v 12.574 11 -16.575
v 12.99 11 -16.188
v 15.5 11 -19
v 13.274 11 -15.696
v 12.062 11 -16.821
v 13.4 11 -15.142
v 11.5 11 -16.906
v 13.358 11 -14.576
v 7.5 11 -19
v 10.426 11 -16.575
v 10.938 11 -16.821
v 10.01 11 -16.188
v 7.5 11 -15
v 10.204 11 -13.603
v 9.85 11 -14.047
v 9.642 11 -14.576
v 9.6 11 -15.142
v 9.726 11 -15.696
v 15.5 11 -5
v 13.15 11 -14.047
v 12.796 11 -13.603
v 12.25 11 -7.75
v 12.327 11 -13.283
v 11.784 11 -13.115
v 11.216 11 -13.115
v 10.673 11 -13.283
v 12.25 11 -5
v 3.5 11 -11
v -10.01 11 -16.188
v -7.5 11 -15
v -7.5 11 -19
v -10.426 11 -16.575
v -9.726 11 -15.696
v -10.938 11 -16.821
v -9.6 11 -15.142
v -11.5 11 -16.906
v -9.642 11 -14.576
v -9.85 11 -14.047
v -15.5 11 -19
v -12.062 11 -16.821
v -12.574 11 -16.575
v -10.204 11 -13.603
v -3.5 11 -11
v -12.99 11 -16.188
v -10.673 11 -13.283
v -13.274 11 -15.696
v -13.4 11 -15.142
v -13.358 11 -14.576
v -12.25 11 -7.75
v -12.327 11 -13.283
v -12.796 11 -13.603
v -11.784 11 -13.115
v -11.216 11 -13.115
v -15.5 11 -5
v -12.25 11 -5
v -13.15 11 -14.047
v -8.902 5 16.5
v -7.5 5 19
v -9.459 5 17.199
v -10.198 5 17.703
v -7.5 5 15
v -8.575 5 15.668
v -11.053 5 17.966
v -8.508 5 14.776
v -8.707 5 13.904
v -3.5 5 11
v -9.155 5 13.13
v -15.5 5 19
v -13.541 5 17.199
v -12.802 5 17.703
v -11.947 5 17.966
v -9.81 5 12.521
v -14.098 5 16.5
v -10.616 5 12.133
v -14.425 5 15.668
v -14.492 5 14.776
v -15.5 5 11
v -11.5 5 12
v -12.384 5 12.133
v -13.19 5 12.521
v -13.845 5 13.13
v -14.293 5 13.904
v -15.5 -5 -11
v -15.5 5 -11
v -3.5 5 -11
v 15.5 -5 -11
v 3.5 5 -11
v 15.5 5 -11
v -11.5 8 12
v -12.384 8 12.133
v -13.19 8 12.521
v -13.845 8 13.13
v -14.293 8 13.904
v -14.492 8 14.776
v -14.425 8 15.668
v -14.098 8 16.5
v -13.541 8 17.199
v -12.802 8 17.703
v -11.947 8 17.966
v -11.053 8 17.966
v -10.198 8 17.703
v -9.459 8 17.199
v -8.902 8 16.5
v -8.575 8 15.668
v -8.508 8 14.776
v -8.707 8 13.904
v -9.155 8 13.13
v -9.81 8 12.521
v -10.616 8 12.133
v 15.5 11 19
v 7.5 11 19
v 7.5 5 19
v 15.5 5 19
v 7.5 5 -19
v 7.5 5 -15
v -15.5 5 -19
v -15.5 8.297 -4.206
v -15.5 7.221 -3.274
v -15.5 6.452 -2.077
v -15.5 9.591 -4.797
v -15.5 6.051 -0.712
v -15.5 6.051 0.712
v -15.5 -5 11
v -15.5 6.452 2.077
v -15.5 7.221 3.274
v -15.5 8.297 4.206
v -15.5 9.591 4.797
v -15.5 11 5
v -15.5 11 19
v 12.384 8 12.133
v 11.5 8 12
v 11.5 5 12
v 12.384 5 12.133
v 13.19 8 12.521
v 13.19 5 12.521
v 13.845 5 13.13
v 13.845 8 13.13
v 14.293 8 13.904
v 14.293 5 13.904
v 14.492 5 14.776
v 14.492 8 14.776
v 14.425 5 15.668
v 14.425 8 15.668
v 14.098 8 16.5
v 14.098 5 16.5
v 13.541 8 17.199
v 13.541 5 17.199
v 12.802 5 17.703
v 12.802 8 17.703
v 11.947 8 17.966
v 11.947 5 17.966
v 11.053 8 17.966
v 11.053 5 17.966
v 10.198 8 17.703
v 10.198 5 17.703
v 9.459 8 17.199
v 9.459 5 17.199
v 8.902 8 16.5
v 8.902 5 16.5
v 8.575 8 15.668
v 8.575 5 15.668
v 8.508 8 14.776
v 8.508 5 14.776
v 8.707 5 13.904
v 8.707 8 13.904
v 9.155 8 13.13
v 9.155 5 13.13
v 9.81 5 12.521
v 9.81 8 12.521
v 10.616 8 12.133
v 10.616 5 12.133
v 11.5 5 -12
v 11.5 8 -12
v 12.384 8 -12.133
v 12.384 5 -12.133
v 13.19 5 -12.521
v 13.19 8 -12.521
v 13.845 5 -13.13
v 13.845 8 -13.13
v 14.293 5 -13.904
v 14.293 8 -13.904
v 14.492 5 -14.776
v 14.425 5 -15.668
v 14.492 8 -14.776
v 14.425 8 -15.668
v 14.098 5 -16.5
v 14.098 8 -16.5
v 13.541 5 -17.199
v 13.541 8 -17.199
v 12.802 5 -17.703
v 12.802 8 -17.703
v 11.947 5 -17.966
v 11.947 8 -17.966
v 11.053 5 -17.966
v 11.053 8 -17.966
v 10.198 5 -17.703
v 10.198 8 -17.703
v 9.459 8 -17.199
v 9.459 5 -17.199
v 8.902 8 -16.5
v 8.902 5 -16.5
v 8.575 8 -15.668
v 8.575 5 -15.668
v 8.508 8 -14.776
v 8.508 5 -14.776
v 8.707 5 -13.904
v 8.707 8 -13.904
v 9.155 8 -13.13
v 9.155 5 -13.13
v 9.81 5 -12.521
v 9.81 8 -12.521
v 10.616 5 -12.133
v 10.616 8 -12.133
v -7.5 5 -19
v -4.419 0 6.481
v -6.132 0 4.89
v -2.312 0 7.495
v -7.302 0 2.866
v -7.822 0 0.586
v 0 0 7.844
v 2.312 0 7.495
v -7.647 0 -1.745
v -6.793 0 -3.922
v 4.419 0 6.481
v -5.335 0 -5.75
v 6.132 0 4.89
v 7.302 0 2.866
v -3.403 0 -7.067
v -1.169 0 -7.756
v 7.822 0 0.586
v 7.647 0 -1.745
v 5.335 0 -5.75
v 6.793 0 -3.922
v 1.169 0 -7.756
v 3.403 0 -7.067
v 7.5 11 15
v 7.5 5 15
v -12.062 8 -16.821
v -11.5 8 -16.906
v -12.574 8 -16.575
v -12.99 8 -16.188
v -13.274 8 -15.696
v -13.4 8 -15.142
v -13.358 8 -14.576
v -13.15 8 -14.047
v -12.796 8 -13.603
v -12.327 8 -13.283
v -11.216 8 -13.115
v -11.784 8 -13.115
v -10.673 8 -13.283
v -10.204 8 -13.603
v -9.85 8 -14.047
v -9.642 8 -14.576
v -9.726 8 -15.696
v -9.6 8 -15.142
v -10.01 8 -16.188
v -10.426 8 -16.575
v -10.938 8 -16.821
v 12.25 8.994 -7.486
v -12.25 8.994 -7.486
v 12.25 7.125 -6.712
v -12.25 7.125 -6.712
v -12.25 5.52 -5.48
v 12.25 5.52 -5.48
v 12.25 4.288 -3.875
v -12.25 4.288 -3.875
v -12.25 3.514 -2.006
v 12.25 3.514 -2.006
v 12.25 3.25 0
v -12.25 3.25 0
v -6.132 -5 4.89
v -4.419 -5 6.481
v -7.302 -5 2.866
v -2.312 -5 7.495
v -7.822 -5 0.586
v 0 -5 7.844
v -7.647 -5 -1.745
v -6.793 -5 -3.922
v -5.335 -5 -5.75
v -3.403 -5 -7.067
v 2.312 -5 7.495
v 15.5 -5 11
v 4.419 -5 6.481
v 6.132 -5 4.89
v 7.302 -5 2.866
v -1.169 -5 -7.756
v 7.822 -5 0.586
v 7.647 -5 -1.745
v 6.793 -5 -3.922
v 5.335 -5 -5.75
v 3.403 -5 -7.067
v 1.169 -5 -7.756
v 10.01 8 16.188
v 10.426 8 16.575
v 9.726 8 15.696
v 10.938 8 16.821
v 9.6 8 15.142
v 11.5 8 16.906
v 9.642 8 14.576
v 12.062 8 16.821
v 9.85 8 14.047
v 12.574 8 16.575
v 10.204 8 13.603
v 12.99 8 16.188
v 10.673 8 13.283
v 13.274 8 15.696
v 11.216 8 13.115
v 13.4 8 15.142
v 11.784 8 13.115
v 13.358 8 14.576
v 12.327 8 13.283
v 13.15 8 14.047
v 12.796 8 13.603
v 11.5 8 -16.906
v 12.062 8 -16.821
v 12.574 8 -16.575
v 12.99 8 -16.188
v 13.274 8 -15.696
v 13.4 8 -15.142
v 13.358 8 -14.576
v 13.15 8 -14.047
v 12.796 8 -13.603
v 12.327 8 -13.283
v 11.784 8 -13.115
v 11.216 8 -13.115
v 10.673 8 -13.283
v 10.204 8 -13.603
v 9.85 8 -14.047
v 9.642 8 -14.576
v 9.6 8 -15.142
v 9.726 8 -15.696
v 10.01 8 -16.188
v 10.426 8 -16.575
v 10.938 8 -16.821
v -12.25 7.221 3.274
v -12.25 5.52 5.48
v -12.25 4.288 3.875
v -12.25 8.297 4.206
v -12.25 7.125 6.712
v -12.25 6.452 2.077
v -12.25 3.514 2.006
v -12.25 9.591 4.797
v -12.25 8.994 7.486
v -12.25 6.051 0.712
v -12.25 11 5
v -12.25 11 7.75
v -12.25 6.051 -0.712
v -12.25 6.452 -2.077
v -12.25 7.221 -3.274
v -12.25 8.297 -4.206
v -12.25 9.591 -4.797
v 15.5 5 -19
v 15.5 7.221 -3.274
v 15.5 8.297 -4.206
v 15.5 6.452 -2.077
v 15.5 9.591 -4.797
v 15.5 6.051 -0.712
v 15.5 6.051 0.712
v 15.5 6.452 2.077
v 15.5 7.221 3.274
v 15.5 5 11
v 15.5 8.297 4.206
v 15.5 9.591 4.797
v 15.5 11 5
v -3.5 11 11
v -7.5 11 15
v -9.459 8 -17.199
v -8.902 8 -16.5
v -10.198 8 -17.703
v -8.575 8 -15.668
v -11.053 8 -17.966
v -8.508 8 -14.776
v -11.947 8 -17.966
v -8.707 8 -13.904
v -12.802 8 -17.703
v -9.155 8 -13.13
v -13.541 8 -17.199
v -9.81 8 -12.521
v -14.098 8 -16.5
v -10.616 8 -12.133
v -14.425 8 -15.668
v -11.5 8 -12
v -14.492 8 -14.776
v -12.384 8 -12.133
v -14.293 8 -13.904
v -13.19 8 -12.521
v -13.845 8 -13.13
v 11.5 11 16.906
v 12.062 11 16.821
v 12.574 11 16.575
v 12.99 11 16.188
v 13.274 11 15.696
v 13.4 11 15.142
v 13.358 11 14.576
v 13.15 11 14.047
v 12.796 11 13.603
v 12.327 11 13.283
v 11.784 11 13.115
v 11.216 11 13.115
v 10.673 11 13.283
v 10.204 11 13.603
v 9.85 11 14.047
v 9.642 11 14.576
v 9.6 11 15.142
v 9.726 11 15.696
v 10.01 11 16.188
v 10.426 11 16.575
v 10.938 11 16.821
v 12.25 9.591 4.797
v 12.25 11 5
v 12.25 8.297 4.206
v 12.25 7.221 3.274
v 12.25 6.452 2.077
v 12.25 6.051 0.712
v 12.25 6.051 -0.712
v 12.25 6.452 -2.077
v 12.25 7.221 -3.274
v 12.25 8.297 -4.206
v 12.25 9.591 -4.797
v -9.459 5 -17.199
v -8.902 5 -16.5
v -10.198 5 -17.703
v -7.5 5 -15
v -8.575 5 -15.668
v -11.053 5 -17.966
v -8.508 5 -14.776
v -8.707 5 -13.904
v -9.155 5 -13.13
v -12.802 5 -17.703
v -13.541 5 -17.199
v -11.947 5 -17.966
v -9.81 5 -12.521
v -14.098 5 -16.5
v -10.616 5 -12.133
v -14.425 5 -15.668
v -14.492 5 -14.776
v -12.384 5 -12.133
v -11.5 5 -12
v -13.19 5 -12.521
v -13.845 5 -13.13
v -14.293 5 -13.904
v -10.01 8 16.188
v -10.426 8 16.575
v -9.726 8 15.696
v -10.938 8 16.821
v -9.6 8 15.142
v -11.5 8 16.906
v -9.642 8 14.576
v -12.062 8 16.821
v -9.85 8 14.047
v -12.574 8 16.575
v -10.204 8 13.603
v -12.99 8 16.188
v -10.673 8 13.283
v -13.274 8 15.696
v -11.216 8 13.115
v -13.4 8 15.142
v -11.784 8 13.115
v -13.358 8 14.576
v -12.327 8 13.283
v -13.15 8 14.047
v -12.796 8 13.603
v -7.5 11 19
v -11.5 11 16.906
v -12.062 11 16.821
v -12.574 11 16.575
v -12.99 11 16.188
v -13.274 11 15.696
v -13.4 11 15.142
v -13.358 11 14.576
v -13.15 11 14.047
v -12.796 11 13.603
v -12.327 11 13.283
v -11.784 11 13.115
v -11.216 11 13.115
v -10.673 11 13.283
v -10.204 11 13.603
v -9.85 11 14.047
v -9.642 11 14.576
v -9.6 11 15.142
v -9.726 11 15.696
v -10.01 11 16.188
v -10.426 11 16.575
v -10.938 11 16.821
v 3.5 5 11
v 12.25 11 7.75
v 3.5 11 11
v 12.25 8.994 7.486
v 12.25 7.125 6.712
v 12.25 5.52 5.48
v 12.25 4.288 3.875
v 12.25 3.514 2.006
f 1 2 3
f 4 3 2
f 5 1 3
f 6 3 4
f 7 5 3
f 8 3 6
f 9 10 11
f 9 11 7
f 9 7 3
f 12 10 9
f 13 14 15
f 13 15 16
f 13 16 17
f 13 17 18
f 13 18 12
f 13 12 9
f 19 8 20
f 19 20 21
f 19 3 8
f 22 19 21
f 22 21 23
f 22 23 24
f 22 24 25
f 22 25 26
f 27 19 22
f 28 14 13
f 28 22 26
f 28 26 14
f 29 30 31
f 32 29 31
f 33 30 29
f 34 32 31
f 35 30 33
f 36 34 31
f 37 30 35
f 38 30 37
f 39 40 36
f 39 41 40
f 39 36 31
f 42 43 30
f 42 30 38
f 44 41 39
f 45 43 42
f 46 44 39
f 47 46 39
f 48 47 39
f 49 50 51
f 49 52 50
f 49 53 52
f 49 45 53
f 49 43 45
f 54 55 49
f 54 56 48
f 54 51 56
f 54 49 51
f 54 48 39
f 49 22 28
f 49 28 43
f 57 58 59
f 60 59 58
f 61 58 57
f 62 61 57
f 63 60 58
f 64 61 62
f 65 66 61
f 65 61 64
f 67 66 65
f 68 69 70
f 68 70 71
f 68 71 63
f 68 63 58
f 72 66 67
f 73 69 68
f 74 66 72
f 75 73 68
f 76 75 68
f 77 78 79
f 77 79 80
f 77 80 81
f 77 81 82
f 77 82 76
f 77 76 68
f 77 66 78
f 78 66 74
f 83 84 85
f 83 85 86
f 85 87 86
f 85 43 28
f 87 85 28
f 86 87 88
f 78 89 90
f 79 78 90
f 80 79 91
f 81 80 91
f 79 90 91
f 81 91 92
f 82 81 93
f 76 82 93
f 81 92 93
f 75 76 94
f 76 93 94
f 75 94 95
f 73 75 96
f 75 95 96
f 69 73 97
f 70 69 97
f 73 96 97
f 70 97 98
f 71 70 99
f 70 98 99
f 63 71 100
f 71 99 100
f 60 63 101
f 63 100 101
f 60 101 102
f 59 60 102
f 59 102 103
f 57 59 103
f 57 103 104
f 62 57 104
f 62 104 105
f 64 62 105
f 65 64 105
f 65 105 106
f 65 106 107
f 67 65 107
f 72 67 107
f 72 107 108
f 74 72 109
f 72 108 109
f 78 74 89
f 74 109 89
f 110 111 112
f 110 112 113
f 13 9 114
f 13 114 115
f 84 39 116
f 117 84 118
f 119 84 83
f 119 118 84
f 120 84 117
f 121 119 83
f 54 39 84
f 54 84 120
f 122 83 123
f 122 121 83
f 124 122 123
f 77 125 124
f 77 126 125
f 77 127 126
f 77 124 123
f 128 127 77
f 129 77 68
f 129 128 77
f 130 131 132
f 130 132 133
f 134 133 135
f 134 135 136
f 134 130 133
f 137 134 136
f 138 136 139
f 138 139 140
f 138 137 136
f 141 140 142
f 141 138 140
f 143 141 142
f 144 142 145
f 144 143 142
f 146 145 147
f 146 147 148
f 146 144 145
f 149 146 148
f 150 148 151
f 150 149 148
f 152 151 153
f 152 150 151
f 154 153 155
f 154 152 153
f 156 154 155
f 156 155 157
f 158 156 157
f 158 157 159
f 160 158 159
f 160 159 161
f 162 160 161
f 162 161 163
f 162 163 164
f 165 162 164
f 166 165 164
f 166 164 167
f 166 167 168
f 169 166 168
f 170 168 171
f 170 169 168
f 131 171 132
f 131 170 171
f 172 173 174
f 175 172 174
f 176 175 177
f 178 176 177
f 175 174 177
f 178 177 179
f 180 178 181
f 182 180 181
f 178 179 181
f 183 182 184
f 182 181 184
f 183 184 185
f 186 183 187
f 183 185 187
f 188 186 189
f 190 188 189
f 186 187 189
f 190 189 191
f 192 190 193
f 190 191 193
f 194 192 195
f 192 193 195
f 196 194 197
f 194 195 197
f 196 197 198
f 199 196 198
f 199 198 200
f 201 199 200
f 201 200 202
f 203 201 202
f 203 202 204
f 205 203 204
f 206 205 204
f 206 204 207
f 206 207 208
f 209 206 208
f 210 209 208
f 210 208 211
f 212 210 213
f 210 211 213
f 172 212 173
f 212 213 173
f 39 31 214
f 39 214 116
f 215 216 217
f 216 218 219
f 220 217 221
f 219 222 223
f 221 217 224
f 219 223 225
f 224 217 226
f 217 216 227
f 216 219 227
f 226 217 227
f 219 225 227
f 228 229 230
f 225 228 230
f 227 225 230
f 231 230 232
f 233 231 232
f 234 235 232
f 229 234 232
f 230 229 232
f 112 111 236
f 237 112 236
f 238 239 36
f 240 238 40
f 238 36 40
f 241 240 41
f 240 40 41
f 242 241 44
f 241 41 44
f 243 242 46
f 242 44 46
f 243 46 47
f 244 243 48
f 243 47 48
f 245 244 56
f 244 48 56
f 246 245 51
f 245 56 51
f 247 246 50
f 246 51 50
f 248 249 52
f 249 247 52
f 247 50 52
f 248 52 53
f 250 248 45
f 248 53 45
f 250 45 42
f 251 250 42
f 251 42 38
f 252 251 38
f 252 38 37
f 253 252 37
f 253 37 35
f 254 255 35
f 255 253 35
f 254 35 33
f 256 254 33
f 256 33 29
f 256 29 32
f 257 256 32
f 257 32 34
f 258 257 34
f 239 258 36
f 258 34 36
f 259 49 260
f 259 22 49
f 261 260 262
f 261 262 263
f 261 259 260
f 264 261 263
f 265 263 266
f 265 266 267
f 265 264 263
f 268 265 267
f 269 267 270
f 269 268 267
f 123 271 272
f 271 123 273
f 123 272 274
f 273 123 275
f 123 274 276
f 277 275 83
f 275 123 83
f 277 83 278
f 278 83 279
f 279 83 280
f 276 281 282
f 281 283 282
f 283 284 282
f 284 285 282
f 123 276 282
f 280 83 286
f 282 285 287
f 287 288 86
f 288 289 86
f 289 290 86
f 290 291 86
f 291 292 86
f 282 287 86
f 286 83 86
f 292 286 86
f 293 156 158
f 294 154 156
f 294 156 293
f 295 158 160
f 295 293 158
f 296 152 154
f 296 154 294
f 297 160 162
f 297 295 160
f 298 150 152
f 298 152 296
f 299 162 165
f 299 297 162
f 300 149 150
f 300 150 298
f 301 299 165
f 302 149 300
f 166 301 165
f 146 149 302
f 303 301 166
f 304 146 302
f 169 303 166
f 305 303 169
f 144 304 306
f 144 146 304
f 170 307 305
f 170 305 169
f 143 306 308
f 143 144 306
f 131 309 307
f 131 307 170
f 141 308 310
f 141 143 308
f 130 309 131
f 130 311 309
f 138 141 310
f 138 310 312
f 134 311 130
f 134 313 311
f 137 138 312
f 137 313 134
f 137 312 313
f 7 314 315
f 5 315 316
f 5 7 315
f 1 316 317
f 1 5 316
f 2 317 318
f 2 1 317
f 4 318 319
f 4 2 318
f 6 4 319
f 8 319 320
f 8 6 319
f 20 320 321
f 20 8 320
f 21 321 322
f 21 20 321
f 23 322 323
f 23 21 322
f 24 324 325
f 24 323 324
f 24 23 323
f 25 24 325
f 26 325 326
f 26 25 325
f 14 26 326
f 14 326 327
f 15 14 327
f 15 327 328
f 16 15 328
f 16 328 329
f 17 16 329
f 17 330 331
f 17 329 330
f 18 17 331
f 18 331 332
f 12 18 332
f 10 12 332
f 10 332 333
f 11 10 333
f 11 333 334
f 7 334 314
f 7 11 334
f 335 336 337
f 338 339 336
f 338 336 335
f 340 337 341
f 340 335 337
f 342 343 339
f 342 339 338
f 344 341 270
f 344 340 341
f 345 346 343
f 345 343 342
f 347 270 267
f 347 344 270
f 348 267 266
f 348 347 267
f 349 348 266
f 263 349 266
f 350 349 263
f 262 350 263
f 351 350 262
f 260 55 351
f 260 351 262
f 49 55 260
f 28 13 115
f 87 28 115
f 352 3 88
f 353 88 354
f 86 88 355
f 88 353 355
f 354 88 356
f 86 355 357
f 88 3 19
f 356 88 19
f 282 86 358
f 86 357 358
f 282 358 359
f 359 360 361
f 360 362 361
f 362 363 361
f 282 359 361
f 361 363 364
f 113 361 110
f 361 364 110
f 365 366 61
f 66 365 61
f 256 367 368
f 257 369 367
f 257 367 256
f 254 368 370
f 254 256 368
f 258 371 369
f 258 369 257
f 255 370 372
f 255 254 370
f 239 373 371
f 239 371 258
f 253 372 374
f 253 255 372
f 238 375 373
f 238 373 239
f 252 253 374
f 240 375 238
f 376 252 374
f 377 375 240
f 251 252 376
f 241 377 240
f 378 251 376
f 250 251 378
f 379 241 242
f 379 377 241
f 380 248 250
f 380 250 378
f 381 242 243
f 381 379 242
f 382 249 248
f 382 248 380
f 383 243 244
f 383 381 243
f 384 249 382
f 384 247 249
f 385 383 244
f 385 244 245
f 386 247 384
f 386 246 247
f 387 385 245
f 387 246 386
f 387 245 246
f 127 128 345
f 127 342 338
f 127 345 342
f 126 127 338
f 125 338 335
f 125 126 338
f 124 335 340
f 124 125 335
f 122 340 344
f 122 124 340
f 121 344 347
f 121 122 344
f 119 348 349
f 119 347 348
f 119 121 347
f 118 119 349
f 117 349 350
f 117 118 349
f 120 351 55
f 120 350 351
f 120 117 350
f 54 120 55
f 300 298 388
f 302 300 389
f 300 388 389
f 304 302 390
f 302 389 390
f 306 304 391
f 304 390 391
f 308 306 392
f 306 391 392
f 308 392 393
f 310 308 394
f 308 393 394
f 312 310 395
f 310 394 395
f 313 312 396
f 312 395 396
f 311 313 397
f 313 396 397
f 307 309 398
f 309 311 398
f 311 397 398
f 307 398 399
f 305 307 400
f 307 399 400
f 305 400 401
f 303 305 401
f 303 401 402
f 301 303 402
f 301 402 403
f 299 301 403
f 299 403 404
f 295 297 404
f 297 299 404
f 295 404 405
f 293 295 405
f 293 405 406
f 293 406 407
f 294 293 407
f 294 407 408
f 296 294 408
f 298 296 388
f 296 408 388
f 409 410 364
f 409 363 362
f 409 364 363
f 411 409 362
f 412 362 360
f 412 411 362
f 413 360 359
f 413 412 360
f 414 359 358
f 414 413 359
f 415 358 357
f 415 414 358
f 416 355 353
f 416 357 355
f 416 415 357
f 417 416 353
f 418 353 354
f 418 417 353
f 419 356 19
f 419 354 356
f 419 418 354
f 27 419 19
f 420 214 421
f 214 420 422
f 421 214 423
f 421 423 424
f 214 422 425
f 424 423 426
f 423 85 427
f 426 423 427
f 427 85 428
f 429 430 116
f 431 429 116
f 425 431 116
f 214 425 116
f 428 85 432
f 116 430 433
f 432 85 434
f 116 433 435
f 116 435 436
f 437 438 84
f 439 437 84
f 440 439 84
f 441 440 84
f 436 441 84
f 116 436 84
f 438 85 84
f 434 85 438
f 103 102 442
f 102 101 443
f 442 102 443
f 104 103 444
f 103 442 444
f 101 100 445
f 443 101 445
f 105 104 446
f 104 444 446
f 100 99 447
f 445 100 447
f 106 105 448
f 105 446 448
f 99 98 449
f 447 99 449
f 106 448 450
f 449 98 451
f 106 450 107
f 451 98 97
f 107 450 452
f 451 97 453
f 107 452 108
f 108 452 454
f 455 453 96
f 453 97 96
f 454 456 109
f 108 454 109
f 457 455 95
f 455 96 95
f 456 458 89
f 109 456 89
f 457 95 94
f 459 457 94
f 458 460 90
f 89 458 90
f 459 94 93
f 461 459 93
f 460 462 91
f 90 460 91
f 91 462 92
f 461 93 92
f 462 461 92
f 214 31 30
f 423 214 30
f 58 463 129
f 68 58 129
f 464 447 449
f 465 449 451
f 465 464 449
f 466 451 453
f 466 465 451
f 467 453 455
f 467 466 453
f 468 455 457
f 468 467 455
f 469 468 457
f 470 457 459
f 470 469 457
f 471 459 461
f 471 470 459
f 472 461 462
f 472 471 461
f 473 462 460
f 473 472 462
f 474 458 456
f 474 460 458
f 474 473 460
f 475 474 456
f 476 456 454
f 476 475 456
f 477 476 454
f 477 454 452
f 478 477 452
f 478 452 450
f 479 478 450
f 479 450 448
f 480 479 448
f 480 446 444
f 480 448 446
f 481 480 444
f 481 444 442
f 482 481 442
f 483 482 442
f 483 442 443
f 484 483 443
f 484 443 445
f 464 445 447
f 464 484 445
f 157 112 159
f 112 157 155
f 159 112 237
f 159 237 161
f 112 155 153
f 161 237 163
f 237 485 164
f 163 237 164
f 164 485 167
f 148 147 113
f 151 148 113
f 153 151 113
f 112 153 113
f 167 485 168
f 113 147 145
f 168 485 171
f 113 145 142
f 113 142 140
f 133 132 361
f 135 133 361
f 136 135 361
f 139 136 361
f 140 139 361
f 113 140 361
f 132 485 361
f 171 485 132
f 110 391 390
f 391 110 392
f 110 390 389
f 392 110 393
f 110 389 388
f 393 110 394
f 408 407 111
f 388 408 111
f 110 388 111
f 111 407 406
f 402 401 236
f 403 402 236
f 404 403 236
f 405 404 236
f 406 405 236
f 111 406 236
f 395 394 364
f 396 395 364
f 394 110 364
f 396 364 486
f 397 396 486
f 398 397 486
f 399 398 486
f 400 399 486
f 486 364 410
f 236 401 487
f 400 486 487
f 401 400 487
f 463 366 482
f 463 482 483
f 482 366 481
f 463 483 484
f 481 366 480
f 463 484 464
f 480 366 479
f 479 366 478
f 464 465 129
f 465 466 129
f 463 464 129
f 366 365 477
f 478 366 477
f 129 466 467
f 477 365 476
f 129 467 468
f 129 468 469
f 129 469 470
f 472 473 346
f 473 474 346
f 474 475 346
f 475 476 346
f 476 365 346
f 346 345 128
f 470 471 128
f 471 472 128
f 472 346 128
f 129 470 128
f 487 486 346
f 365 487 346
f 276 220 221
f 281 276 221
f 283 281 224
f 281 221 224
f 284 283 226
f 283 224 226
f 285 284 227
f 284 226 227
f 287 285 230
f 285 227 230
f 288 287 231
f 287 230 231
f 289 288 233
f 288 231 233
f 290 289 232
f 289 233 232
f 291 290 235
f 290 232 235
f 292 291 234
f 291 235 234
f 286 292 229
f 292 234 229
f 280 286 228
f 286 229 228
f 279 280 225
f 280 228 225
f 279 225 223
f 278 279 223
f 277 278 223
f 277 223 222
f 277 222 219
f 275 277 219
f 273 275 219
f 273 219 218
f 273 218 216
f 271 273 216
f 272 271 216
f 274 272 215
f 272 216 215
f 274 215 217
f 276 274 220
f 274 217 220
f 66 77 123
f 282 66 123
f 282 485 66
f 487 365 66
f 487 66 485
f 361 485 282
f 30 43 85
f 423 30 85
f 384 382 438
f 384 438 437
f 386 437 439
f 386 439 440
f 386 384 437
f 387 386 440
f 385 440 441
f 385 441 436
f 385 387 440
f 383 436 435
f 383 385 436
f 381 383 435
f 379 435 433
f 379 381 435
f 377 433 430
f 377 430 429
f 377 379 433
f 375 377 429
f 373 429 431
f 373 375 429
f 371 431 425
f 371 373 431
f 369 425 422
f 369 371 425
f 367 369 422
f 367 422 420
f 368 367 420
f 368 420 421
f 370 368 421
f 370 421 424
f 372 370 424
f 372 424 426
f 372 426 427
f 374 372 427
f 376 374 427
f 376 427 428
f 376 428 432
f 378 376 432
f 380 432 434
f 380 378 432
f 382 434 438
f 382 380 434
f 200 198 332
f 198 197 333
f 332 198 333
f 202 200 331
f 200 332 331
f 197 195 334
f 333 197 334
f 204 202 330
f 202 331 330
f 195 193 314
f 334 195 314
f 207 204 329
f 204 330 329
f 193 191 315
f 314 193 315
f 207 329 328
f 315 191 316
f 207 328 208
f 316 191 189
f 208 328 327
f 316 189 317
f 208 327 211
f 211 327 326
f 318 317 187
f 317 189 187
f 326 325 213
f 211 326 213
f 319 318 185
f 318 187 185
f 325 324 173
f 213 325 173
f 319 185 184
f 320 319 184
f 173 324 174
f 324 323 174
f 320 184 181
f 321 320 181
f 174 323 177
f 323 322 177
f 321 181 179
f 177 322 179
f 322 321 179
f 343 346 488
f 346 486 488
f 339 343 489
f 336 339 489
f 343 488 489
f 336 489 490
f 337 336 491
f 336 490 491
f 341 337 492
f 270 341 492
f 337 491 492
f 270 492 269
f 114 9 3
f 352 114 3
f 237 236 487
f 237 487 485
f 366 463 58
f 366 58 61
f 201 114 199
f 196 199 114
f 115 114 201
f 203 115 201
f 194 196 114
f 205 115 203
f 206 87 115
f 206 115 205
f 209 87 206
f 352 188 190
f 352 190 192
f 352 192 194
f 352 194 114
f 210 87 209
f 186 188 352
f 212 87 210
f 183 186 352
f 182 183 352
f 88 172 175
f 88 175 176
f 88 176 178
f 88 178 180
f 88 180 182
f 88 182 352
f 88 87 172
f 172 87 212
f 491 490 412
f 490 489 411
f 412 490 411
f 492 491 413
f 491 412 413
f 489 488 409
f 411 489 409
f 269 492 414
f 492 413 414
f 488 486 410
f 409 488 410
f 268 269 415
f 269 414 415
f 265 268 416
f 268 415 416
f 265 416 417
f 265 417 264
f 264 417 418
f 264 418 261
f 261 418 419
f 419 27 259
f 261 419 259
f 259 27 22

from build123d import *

# Parameters (mm, degrees)
SKETCH1_W                 = 31
SKETCH1_H                 = 22
BOSS_EXTRUDE1_DEPTH       = 11
SKETCH2_W                 = 31
SKETCH2_H                 = 22
SKETCH2_R                 = 7.843750423
BOSS_EXTRUDE2_DEPTH       = 5
SKETCH3_W                 = 24.5
SKETCH3_H                 = 15.5
CUT_EXTRUDE1_DEPTH        = 7.75
FILLET1_R                 = 7.75
CUT_EXTRUDE2_DEPTH        = 32.812929761
CUT_EXTRUDE2_DEPTH_BACK   = 32.812929761
SKETCH4_R                 = 5
SKETCH5_W                 = 8
SKETCH5_H                 = 8
SKETCH5_R                 = 1.905800151
BOSS_EXTRUDE3_DEPTH       = 6
CUT_EXTRUDE3_START        = -3
SKETCH6_R                 = 3
SKETCH6_R_2               = 1.905800151
CUT_EXTRUDE3_DEPTH        = 3
MIRROR9_COPY_1_SKETCH_W   = 8
MIRROR9_COPY_1_SKETCH_H   = 8
MIRROR9_COPY_1_SKETCH_R   = 1.905800151
MIRROR9_COPY_1_DEPTH      = 6
MIRROR9_START             = -3
MIRROR9_COPY_2_SKETCH_R   = 3
MIRROR9_COPY_2_SKETCH_R_2 = 1.905800151
MIRROR9_COPY_2_DEPTH      = 3
CHAMFER2_SIZE             = 4


with BuildPart() as part:
    # Sketch1 → Boss-Extrude1 (new body)
    with BuildSketch(Plane(origin=(0, 0, 0), x_dir=(1, 0, 0), z_dir=(0, 1, 0))):
        Rectangle(SKETCH1_W, SKETCH1_H)
    extrude(amount=BOSS_EXTRUDE1_DEPTH)

    # Sketch2 → Boss-Extrude2 (add)
    with BuildSketch(Plane(origin=(0, 0, 0), x_dir=(1, 0, 0), z_dir=(0, 1, 0))):
        Rectangle(SKETCH2_W, SKETCH2_H)
        with Locations(Location((0, 0, 0), (0, 0, 270))):
            Circle(SKETCH2_R, mode=Mode.SUBTRACT)
    extrude(amount=-BOSS_EXTRUDE2_DEPTH)

    # Sketch3 → Cut-Extrude1 (cut)
    with BuildSketch(Plane(origin=(0, 11, 0), x_dir=(1, 0, 0), z_dir=(0, 1, 0))):
        Rectangle(SKETCH3_W, SKETCH3_H)
    extrude(amount=-CUT_EXTRUDE1_DEPTH, mode=Mode.SUBTRACT)

    # Fillet1
    fillet1_edges = [part.edges().sort_by_distance(p)[0] for p in [
        (0, 3.25, 7.75),
        (0, 3.25, -7.75),
    ]]
    fillet(fillet1_edges, radius=FILLET1_R - 0.0001)  # a hair under: the kernel refuses the full size

    # Sketch4 → Cut-Extrude2 (cut, two sides: drawn at the far end of the back side and taken through both)
    with BuildSketch(Plane(origin=(-12.25, 0, 0), x_dir=(0, 0, -1), z_dir=(1, 0, 0)).offset(-CUT_EXTRUDE2_DEPTH_BACK)):
        with Locations((0, 11)):
            Circle(SKETCH4_R)
    extrude(amount=CUT_EXTRUDE2_DEPTH + CUT_EXTRUDE2_DEPTH_BACK, mode=Mode.SUBTRACT)

    # Sketch5 → Boss-Extrude3 (add)
    with BuildSketch(Plane(origin=(0, 11, 0), x_dir=(1, 0, 0), z_dir=(0, 1, 0))):
        with Locations((11.5, -15)):
            Rectangle(SKETCH5_W, SKETCH5_H)
        with Locations(Location((11.5, -15, 0), (0, 0, 270))):
            Circle(SKETCH5_R, mode=Mode.SUBTRACT)
    boss_extrude3 = extrude(amount=-BOSS_EXTRUDE3_DEPTH)

    # Sketch6 → Cut-Extrude3 (cut)
    with BuildSketch(Plane.XZ.offset(-5).offset(CUT_EXTRUDE3_START)):
        with Locations(Location((11.5, 15, 0), (0, 0, 270))):
            Circle(SKETCH6_R)
        with Locations(Location((11.5, 15, 0), (0, 0, 90))):
            Circle(SKETCH6_R_2, mode=Mode.SUBTRACT)
    cut_extrude3 = extrude(amount=CUT_EXTRUDE3_DEPTH, mode=Mode.SUBTRACT)

    # Mirror8: Boss-Extrude3, Cut-Extrude3 across plane
    add(boss_extrude3.mirror(Plane(origin=(0, 0, 0), x_dir=(0, 0, 1), z_dir=(1, 0, 0))))
    add(cut_extrude3.mirror(Plane(origin=(0, 0, 0), x_dir=(0, 0, 1), z_dir=(1, 0, 0))), mode=Mode.SUBTRACT)

    # Mirror9: Boss-Extrude3, Cut-Extrude3 across plane
    add(boss_extrude3.mirror(Plane.XY))
    add(cut_extrude3.mirror(Plane.XY), mode=Mode.SUBTRACT)

    # Mirror9 copy 1 sketch → Mirror9 copy 1 (add)
    with BuildSketch(Plane(origin=(0, 11, 0), x_dir=(-1, 0, 0), z_dir=(0, 1, 0))):
        with Locations((11.5, -15)):
            Rectangle(MIRROR9_COPY_1_SKETCH_W, MIRROR9_COPY_1_SKETCH_H)
        with Locations(Location((11.5, -15, 0), (0, 0, 270))):
            Circle(MIRROR9_COPY_1_SKETCH_R, mode=Mode.SUBTRACT)
    extrude(amount=-MIRROR9_COPY_1_DEPTH)

    # Mirror9 copy 2 sketch → Mirror9 copy 2 (cut)
    with BuildSketch(Plane(origin=(0, 5, 0), x_dir=(-1, 0, 0), z_dir=(0, -1, 0)).offset(MIRROR9_START)):
        with Locations(Location((11.5, 15, 0), (0, 0, 270))):
            Circle(MIRROR9_COPY_2_SKETCH_R)
        with Locations(Location((11.5, 15, 0), (0, 0, 90))):
            Circle(MIRROR9_COPY_2_SKETCH_R_2, mode=Mode.SUBTRACT)
    extrude(amount=MIRROR9_COPY_2_DEPTH, mode=Mode.SUBTRACT)

    # Chamfer2
    chamfer2_edges = [part.edges().sort_by_distance(p)[0] for p in [
        (-7.5, 8, -11),
        (7.5, 8, -11),
        (7.5, 8, 11),
        (-7.5, 8, 11),
    ]]
    chamfer(chamfer2_edges, length=CHAMFER2_SIZE)


solid = part.part
